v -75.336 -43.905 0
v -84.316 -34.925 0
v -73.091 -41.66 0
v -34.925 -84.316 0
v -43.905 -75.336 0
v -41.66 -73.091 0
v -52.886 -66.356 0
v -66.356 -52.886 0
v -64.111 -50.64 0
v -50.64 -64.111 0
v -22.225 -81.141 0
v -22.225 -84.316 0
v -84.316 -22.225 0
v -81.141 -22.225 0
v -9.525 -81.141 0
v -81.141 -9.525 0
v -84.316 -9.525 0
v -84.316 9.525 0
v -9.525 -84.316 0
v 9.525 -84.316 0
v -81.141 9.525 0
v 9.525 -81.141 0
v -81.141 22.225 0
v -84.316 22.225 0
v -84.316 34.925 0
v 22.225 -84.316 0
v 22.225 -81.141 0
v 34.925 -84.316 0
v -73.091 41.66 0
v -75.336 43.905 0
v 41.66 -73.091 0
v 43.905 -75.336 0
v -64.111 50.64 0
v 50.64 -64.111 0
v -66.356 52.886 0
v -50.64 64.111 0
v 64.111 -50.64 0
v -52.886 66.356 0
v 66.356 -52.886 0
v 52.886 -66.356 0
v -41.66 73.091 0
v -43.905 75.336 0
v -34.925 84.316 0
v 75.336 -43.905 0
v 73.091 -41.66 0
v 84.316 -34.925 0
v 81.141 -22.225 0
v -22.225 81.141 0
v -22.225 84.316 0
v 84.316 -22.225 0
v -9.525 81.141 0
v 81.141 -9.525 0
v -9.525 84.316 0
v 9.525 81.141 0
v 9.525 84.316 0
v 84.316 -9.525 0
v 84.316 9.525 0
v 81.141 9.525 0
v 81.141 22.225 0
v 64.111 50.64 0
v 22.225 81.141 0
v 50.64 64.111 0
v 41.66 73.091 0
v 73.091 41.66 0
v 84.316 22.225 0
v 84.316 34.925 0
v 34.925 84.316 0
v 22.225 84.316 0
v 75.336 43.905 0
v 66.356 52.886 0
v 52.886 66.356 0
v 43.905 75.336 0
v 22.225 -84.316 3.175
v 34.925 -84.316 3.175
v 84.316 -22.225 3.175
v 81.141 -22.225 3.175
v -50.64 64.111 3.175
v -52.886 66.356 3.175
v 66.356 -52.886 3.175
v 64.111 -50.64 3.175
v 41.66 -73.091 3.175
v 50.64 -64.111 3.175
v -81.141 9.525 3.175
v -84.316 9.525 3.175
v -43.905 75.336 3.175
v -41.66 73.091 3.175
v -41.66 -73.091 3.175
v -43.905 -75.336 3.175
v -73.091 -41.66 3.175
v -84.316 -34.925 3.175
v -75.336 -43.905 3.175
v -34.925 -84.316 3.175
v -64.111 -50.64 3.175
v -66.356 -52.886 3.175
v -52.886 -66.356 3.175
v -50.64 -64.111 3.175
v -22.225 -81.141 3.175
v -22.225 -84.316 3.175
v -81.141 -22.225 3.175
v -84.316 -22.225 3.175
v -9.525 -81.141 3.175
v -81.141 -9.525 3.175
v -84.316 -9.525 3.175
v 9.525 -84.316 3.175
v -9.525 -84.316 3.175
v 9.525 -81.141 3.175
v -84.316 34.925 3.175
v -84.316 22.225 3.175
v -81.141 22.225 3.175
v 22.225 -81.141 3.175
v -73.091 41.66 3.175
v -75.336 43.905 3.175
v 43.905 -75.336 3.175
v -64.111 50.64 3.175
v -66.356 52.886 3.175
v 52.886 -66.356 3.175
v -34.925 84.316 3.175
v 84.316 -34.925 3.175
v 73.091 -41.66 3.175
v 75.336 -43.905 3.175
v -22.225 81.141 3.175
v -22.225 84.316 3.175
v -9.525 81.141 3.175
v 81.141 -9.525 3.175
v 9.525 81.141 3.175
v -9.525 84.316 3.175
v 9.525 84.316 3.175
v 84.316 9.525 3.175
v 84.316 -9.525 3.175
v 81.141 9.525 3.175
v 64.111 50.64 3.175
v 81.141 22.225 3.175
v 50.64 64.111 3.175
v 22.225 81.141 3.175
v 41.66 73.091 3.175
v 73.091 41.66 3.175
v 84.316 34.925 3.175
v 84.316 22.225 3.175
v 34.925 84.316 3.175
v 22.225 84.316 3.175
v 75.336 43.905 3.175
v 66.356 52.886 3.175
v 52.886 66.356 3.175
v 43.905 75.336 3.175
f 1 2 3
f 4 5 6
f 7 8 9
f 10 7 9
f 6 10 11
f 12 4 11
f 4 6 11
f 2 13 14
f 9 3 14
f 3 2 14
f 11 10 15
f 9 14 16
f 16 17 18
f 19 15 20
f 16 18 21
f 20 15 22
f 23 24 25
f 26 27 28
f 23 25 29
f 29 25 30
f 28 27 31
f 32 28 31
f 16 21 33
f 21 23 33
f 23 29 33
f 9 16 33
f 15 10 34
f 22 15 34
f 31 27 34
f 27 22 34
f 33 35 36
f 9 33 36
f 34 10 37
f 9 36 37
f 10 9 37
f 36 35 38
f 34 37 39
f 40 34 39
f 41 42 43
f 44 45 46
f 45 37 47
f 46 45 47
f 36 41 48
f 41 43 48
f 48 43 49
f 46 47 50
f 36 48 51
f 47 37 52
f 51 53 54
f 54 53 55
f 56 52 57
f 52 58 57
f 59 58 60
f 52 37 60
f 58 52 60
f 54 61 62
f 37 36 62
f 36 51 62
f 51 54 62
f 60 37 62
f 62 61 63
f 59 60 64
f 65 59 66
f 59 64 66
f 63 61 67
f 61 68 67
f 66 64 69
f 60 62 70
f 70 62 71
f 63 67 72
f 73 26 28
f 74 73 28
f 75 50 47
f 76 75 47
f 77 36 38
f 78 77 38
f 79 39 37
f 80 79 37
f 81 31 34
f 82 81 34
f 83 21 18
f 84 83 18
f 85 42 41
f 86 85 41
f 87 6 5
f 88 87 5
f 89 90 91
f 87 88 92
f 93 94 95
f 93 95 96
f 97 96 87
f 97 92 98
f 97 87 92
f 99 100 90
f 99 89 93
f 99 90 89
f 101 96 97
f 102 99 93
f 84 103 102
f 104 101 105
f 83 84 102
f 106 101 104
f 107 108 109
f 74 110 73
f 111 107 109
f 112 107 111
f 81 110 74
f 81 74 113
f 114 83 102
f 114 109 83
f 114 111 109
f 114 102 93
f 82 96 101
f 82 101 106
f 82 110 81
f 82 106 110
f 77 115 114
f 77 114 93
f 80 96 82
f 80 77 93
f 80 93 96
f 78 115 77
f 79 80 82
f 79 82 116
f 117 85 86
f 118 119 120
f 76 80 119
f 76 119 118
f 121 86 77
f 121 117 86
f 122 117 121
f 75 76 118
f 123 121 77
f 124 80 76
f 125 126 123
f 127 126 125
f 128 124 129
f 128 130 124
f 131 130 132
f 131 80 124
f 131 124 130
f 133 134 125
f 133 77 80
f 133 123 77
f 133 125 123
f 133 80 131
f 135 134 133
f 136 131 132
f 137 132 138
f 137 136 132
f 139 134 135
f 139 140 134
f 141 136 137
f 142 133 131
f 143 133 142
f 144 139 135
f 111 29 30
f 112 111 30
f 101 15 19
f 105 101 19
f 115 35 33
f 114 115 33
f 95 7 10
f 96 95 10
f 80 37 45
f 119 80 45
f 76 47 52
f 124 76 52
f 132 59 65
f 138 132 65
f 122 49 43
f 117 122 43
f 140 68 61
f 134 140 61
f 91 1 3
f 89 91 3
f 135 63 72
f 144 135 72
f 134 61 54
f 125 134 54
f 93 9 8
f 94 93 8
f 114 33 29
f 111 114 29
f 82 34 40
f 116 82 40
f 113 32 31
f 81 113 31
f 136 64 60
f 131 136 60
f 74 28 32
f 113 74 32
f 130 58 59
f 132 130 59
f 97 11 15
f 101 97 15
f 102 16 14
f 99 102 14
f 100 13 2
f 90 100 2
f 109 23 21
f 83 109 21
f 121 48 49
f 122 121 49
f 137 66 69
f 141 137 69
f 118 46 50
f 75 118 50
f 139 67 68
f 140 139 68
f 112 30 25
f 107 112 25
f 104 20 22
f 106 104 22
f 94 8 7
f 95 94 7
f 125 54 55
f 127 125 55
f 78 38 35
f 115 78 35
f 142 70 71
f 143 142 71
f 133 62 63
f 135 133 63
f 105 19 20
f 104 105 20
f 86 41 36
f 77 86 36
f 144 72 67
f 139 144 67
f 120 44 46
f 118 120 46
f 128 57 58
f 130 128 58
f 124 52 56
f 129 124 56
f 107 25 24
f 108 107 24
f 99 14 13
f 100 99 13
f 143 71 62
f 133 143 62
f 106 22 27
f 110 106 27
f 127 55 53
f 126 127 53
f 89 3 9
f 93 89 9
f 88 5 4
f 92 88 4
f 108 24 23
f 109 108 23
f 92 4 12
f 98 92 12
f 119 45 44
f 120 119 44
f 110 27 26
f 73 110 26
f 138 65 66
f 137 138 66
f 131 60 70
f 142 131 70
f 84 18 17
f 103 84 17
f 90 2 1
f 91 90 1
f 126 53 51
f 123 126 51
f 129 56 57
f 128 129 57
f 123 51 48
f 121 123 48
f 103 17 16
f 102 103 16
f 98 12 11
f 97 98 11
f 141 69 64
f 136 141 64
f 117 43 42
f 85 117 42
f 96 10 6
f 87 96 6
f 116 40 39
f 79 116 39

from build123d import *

# Parameters (mm, degrees)
BOSS_EXTRUDE1_DEPTH = 3.175


with BuildPart() as part:
    # Sketch1 → Boss-Extrude1 (new body)
    with BuildSketch(Plane.XY):
        Polygon((50.640448212, 64.110832393), (41.660192091, 73.091088515), (43.905256121, 75.336152545), (34.925, 84.316408666), (22.225, 84.316408666), (22.225, 81.141408666), (9.525, 81.141408666), (9.525, 84.316408666), (-9.525, 84.316408666), (-9.525, 81.141408666), (-22.225, 81.141408666), (-22.225, 84.316408666), (-34.925, 84.316408666), (-43.905256121, 75.336152545), (-41.660192091, 73.091088515), (-50.640448212, 64.110832393), (-52.885512242, 66.355896424), (-66.355896424, 52.885512242), (-64.110832393, 50.640448212), (-73.091088515, 41.660192091), (-75.336152545, 43.905256121), (-84.316408666, 34.925), (-84.316408666, 22.225), (-81.141408666, 22.225), (-81.141408666, 9.525), (-84.316408666, 9.525), (-84.316408666, -9.525), (-81.141408666, -9.525), (-81.141408666, -22.225), (-84.316408666, -22.225), (-84.316408666, -34.925), (-75.336152545, -43.905256121), (-73.091088515, -41.660192091), (-64.110832393, -50.640448212), (-66.355896424, -52.885512242), (-52.885512242, -66.355896424), (-50.640448212, -64.110832393), (-41.660192091, -73.091088515), (-43.905256121, -75.336152545), (-34.925, -84.316408666), (-22.225, -84.316408666), (-22.225, -81.141408666), (-9.525, -81.141408666), (-9.525, -84.316408666), (9.525, -84.316408666), (9.525, -81.141408666), (22.225, -81.141408666), (22.225, -84.316408666), (34.925, -84.316408666), (43.905256121, -75.336152545), (41.660192091, -73.091088515), (50.640448212, -64.110832393), (52.885512242, -66.355896424), (66.355896424, -52.885512242), (64.110832393, -50.640448212), (73.091088515, -41.660192091), (75.336152545, -43.905256121), (84.316408666, -34.925), (84.316408666, -22.225), (81.141408666, -22.225), (81.141408666, -9.525), (84.316408666, -9.525), (84.316408666, 9.525), (81.141408666, 9.525), (81.141408666, 22.225), (84.316408666, 22.225), (84.316408666, 34.925), (75.336152545, 43.905256121), (73.091088515, 41.660192091), (64.110832393, 50.640448212), (66.355896424, 52.885512242), (52.885512242, 66.355896424), align=None)
    extrude(amount=BOSS_EXTRUDE1_DEPTH)


solid = part.part
